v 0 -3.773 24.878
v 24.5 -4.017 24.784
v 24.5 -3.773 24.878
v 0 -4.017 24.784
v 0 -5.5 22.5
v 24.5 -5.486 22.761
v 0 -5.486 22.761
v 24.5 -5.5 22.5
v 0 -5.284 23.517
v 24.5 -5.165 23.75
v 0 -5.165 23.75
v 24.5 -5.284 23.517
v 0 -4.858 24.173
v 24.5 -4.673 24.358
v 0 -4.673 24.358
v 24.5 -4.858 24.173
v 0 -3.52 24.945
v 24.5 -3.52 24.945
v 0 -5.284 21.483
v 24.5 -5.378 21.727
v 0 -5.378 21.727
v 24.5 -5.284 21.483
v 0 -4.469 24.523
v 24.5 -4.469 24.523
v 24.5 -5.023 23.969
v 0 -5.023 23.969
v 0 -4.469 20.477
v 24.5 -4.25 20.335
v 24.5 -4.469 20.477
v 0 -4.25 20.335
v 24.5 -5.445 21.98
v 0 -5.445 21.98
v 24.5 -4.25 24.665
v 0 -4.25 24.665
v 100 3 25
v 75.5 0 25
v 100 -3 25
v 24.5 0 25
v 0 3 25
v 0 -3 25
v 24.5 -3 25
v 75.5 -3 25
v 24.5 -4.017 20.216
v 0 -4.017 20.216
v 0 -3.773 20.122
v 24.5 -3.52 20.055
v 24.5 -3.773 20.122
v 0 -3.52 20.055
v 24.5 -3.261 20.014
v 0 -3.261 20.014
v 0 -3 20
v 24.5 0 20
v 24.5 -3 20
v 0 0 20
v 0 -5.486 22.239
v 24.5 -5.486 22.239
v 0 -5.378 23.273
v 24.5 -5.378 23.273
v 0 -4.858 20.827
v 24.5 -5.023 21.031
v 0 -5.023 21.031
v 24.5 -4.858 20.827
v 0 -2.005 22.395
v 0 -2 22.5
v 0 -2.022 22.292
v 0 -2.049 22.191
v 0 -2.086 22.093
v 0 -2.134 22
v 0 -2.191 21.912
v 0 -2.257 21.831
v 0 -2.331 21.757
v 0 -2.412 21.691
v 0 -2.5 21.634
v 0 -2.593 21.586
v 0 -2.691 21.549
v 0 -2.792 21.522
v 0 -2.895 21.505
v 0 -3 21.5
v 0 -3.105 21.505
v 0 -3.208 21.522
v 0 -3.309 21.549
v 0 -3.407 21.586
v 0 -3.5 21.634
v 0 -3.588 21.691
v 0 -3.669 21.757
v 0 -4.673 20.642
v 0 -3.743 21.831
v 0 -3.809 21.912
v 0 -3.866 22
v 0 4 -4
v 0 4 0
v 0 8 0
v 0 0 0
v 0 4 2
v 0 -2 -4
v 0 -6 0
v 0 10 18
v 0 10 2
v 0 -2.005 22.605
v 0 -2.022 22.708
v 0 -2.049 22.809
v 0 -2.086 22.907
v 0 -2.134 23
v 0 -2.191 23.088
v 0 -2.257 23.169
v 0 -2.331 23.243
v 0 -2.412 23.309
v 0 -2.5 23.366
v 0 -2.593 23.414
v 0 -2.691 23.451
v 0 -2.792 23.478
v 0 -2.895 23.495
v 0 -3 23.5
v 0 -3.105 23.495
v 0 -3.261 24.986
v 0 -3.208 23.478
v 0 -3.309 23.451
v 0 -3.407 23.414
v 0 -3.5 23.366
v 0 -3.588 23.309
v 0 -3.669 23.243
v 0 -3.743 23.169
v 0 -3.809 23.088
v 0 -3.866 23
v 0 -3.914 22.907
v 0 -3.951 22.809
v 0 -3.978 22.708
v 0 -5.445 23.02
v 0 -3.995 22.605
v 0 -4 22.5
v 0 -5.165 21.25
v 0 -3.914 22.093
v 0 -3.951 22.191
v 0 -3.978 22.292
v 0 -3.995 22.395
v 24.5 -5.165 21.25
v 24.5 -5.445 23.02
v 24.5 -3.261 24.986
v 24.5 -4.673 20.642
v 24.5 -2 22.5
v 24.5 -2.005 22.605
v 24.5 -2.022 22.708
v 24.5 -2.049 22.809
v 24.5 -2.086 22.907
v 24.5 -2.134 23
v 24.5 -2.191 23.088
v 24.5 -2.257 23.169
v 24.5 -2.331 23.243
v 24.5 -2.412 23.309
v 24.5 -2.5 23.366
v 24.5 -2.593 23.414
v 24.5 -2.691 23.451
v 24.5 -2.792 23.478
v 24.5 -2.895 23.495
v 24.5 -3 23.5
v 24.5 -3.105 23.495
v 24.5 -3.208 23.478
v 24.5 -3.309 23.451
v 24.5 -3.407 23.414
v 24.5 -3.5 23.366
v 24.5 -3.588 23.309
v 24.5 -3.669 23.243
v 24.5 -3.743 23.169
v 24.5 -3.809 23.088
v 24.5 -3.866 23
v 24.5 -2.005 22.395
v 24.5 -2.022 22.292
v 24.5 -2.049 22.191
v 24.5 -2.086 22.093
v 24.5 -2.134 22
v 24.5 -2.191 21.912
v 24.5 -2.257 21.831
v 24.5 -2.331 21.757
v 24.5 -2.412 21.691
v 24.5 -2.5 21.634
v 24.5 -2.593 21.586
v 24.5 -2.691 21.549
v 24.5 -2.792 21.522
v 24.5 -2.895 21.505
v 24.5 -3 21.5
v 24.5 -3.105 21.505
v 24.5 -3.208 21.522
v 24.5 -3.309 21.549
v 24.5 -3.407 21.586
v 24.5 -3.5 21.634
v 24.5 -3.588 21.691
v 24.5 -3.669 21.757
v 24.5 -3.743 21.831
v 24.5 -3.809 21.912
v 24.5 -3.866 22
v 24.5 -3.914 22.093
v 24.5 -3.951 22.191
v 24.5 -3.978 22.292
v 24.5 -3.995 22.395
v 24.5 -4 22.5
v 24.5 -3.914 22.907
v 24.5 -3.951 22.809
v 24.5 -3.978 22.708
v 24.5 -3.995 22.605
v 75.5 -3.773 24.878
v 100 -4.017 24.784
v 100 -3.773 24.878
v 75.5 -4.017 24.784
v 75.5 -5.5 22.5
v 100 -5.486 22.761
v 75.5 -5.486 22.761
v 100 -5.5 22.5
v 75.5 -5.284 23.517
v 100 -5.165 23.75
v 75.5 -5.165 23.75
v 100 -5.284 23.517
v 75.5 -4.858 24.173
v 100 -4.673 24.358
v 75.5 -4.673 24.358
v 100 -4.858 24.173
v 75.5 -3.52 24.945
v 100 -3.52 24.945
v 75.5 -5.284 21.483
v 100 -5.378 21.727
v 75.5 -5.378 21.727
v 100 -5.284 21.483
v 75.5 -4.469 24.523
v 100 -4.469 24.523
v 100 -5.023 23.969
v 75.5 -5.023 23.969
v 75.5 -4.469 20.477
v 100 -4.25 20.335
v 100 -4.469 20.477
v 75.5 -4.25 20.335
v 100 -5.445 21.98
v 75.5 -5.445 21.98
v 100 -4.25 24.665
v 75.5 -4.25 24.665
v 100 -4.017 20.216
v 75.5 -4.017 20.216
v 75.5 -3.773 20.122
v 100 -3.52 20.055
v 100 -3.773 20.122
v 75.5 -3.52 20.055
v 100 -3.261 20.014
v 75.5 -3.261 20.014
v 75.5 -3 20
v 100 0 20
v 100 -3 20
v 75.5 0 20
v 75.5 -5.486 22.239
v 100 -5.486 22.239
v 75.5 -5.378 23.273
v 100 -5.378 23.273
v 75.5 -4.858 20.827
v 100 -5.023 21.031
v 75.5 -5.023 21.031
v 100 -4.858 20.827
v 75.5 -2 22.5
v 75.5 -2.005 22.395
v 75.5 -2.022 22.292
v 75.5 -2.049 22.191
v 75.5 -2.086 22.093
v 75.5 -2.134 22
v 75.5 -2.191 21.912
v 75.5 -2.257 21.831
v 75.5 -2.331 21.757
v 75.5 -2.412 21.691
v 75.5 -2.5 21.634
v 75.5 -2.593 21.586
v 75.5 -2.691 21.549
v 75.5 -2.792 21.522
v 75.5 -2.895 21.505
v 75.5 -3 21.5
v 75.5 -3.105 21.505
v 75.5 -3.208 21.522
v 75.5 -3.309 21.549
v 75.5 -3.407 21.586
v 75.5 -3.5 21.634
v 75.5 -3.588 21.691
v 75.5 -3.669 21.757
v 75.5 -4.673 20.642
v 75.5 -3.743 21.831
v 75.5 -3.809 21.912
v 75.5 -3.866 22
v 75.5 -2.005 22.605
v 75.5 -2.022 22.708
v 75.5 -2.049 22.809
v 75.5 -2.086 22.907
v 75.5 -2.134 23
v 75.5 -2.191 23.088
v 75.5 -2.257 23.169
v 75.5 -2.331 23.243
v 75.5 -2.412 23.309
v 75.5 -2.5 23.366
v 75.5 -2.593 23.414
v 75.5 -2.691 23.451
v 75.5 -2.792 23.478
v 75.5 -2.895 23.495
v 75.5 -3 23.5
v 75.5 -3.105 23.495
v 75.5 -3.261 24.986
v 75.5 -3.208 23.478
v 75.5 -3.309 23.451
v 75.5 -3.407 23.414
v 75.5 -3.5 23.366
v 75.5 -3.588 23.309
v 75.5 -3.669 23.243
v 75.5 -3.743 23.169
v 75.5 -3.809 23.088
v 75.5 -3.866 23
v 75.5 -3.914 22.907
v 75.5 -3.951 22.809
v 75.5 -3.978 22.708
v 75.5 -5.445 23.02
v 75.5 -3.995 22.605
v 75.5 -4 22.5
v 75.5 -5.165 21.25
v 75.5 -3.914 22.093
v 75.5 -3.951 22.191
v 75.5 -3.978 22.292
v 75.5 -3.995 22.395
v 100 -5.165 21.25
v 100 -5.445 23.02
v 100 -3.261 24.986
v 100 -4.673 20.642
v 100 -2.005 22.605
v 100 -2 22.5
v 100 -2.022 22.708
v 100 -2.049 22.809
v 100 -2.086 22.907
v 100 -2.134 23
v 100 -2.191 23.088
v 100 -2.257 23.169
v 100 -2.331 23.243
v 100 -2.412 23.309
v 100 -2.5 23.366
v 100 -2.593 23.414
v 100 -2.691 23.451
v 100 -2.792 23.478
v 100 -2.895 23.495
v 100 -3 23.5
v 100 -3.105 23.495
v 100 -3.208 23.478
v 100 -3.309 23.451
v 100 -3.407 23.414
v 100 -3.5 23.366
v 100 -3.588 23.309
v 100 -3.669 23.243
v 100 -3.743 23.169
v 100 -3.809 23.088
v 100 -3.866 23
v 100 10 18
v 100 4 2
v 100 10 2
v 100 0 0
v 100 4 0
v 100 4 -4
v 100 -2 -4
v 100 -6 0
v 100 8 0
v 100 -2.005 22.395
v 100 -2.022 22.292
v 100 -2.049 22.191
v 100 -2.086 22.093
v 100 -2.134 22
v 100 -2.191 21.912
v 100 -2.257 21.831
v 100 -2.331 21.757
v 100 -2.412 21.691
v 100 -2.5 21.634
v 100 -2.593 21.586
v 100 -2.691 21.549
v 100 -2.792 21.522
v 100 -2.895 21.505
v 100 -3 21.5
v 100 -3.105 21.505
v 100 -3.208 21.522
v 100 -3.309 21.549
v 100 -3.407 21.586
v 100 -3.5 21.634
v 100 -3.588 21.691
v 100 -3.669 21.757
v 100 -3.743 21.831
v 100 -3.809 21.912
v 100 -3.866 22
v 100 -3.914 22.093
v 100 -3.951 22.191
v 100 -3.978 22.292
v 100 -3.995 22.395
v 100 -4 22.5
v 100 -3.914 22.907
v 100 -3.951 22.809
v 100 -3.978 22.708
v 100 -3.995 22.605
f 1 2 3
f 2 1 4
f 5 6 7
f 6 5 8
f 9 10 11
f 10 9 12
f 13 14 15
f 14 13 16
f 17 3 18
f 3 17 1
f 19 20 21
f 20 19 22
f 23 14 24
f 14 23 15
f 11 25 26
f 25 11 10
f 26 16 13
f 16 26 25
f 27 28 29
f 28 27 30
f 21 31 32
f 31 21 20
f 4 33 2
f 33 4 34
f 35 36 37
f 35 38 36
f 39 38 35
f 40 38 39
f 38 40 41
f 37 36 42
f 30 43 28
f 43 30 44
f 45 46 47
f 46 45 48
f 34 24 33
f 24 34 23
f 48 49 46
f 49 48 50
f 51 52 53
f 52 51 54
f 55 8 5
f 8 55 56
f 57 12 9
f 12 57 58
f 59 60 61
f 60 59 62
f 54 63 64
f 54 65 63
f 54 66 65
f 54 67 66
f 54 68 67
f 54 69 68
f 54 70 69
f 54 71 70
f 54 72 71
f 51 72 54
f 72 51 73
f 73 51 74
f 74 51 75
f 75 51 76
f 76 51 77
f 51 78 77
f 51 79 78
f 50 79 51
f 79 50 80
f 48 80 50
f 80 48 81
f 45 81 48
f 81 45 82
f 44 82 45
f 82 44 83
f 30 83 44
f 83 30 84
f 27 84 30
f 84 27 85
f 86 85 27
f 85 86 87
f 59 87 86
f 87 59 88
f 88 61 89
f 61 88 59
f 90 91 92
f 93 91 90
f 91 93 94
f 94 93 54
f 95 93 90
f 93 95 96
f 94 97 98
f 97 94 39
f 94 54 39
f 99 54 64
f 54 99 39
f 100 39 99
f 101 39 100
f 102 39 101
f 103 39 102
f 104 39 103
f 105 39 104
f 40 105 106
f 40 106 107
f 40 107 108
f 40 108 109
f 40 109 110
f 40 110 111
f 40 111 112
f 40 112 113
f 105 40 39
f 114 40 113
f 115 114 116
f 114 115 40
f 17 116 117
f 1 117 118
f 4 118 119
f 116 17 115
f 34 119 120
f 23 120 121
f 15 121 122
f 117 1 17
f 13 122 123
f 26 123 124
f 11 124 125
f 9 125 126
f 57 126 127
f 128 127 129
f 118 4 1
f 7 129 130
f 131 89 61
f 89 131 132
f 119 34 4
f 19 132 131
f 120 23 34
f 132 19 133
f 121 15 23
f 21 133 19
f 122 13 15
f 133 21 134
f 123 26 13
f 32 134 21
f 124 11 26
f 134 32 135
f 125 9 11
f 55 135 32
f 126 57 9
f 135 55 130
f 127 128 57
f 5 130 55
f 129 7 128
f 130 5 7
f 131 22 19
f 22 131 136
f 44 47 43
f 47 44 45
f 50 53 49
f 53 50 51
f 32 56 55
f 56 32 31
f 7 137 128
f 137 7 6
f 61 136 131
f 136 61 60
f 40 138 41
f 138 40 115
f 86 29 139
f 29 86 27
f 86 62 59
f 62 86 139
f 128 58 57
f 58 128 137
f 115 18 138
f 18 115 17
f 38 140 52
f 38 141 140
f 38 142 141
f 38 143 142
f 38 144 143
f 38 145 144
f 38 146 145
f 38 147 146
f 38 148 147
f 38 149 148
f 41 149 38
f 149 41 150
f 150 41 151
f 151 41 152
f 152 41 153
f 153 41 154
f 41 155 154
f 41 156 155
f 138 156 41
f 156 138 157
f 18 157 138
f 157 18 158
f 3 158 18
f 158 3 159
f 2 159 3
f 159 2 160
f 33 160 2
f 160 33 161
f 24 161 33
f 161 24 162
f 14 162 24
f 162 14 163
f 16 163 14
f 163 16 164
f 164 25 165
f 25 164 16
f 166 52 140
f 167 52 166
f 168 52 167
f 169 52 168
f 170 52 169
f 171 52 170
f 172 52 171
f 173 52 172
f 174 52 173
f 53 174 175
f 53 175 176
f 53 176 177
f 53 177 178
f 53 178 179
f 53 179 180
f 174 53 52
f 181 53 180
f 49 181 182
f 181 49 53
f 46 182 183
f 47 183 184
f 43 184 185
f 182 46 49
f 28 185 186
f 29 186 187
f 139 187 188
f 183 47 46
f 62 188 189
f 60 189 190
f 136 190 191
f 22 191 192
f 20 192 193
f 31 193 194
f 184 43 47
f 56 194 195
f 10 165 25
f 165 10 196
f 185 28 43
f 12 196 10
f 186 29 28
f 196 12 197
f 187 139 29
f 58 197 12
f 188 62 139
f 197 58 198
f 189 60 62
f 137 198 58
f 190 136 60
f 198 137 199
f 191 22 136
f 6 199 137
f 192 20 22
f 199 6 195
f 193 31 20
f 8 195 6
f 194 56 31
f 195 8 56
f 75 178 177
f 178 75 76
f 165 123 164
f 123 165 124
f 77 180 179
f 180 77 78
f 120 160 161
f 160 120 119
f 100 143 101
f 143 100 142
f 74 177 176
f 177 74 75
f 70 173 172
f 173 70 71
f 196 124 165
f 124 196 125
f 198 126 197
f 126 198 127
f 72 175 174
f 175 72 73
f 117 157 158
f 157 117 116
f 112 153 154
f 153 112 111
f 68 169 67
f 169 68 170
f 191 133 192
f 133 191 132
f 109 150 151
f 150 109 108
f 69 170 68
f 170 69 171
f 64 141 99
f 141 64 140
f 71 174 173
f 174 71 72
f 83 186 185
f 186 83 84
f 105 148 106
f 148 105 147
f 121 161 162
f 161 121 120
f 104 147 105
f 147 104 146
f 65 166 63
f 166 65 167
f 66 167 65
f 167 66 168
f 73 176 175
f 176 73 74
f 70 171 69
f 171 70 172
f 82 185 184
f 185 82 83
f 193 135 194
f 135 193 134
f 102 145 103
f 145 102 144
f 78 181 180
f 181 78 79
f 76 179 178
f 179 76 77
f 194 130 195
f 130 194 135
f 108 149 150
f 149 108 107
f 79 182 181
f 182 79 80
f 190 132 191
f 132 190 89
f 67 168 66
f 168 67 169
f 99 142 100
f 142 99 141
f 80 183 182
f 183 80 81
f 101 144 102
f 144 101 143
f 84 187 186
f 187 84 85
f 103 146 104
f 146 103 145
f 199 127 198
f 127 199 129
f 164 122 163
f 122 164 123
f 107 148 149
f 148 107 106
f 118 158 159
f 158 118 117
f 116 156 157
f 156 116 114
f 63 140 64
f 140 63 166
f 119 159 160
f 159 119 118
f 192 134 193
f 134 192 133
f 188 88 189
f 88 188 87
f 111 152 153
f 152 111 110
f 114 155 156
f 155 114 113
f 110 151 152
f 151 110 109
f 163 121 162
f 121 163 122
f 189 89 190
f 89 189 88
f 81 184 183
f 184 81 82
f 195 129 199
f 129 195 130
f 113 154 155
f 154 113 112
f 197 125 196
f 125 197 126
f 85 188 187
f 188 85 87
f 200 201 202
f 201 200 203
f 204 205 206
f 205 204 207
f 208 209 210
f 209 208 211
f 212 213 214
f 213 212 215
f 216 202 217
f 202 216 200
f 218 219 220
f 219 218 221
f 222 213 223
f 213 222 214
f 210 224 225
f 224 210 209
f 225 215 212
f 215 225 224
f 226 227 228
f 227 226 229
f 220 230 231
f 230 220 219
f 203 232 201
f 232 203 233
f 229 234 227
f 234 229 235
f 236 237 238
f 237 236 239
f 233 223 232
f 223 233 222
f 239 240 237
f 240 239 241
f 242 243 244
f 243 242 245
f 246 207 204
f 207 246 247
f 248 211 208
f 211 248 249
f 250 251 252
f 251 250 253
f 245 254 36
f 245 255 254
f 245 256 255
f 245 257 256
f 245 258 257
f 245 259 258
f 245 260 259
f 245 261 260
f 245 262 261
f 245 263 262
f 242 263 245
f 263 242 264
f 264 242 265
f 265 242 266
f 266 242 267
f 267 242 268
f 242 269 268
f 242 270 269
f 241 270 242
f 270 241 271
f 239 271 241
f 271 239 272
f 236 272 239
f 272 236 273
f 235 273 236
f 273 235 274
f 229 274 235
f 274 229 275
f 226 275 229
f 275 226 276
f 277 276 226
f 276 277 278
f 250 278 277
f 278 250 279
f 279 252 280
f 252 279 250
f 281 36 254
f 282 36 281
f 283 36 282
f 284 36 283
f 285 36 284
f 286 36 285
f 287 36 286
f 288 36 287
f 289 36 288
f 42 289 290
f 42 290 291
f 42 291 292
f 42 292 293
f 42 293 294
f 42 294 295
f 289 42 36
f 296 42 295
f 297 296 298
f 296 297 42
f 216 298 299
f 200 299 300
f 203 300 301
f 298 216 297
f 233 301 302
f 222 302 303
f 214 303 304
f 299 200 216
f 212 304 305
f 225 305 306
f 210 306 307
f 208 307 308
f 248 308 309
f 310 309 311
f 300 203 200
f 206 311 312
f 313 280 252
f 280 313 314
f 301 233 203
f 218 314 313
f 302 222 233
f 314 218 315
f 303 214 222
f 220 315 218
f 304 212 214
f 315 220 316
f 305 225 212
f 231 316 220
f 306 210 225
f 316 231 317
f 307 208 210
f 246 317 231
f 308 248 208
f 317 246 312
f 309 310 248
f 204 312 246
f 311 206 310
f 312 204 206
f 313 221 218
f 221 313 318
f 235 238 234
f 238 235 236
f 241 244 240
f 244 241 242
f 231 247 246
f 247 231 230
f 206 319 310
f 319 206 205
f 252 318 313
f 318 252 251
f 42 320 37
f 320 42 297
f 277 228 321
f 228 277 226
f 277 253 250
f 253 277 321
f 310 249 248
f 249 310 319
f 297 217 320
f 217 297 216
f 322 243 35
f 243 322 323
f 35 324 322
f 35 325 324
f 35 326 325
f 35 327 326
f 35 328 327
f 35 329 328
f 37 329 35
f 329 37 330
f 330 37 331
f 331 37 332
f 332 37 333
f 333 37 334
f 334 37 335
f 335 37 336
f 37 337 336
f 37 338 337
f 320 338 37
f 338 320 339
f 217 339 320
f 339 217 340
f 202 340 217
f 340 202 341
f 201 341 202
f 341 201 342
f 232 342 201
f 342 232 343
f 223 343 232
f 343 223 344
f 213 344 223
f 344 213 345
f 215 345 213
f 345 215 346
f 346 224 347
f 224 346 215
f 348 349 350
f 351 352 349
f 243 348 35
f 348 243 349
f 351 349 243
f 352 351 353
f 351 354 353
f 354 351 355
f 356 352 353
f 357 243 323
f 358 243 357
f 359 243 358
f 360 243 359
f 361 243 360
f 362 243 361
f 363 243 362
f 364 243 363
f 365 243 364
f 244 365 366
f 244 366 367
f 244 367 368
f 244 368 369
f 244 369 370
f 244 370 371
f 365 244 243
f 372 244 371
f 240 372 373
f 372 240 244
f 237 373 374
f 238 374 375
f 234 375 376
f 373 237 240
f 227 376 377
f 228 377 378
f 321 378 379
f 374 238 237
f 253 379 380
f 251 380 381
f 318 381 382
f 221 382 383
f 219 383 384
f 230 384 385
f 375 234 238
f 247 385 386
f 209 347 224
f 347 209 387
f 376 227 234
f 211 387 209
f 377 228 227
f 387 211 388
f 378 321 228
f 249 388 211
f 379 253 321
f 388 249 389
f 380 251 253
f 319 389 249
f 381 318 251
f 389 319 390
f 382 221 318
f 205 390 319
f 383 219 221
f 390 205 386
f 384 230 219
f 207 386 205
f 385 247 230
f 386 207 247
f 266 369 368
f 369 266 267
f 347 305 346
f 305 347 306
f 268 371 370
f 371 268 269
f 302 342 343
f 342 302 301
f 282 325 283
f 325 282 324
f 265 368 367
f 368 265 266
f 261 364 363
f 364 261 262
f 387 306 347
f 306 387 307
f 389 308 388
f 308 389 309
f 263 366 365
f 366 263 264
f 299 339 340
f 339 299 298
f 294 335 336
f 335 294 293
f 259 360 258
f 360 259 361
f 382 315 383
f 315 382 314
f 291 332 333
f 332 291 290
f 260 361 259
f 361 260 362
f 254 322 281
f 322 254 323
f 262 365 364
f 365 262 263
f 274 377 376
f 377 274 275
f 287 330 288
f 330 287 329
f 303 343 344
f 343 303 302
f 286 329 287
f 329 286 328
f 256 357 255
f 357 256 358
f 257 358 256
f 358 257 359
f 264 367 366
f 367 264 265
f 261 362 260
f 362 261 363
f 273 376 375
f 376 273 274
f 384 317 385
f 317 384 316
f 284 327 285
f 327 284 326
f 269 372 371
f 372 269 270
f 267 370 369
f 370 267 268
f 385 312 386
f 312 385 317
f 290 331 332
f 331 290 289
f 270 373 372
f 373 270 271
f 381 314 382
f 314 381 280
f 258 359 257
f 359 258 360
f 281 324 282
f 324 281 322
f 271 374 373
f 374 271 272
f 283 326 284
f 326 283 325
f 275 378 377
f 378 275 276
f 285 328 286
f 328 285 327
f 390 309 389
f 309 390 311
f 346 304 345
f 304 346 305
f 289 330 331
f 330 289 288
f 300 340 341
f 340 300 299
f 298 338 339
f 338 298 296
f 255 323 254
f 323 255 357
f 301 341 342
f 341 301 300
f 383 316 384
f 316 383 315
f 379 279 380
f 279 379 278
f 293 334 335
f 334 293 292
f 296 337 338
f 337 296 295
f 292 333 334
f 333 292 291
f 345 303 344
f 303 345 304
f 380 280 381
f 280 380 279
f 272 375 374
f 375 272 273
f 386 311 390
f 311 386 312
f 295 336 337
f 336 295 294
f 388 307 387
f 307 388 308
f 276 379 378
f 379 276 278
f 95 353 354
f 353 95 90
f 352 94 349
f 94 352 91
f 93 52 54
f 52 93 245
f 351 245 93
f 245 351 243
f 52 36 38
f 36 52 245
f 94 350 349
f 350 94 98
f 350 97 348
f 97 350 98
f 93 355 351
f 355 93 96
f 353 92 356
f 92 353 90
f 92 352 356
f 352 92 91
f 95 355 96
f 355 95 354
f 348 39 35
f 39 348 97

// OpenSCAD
$fn=60;

module hinge()
{
    translate([0, -2.5, 0])
    difference() {
        hull() {
            cube([24.5, 3, 5]);
            translate([0, -0.5, 2.5])
            rotate([0, 90, 0])
            cylinder(d=5, h=24.5);
        }
        translate([-0.5, -0.5, 2.5])
        rotate([0, 90, 0])
        // Initially used 1.9, but had to drill it out a bit.
        cylinder(d=2.0, h=26);
    }
}

difference() {
    union() {
        translate([0, 0, -4])
        cube([100, 4, 29]);
        translate([0, 3, 2])
        cube([100, 7, 23]);
        translate([0, -2, -4])
        cube([100, 2, 4]);
        translate([0, 0, 20])
        hinge();
        translate([75.5, 0, 20])
        hinge();
        translate([0, 6, -6])
        rotate([0, 90, 0])
        linear_extrude(100)
        polygon([[-2,-2], [-6,-2], [-6,2]]);
        translate([0, -4, -6])
        mirror([0, 1, 0])
        rotate([0, 90, 0])
        linear_extrude(100)
        polygon([[-2,-2], [-6,-2], [-6,2]]);
    }
    translate([-0.5, 2, 26])
    rotate([0, 90, 0])
    linear_extrude(101)
    polygon([[16,16], [0,0], [0,16]]);
}
